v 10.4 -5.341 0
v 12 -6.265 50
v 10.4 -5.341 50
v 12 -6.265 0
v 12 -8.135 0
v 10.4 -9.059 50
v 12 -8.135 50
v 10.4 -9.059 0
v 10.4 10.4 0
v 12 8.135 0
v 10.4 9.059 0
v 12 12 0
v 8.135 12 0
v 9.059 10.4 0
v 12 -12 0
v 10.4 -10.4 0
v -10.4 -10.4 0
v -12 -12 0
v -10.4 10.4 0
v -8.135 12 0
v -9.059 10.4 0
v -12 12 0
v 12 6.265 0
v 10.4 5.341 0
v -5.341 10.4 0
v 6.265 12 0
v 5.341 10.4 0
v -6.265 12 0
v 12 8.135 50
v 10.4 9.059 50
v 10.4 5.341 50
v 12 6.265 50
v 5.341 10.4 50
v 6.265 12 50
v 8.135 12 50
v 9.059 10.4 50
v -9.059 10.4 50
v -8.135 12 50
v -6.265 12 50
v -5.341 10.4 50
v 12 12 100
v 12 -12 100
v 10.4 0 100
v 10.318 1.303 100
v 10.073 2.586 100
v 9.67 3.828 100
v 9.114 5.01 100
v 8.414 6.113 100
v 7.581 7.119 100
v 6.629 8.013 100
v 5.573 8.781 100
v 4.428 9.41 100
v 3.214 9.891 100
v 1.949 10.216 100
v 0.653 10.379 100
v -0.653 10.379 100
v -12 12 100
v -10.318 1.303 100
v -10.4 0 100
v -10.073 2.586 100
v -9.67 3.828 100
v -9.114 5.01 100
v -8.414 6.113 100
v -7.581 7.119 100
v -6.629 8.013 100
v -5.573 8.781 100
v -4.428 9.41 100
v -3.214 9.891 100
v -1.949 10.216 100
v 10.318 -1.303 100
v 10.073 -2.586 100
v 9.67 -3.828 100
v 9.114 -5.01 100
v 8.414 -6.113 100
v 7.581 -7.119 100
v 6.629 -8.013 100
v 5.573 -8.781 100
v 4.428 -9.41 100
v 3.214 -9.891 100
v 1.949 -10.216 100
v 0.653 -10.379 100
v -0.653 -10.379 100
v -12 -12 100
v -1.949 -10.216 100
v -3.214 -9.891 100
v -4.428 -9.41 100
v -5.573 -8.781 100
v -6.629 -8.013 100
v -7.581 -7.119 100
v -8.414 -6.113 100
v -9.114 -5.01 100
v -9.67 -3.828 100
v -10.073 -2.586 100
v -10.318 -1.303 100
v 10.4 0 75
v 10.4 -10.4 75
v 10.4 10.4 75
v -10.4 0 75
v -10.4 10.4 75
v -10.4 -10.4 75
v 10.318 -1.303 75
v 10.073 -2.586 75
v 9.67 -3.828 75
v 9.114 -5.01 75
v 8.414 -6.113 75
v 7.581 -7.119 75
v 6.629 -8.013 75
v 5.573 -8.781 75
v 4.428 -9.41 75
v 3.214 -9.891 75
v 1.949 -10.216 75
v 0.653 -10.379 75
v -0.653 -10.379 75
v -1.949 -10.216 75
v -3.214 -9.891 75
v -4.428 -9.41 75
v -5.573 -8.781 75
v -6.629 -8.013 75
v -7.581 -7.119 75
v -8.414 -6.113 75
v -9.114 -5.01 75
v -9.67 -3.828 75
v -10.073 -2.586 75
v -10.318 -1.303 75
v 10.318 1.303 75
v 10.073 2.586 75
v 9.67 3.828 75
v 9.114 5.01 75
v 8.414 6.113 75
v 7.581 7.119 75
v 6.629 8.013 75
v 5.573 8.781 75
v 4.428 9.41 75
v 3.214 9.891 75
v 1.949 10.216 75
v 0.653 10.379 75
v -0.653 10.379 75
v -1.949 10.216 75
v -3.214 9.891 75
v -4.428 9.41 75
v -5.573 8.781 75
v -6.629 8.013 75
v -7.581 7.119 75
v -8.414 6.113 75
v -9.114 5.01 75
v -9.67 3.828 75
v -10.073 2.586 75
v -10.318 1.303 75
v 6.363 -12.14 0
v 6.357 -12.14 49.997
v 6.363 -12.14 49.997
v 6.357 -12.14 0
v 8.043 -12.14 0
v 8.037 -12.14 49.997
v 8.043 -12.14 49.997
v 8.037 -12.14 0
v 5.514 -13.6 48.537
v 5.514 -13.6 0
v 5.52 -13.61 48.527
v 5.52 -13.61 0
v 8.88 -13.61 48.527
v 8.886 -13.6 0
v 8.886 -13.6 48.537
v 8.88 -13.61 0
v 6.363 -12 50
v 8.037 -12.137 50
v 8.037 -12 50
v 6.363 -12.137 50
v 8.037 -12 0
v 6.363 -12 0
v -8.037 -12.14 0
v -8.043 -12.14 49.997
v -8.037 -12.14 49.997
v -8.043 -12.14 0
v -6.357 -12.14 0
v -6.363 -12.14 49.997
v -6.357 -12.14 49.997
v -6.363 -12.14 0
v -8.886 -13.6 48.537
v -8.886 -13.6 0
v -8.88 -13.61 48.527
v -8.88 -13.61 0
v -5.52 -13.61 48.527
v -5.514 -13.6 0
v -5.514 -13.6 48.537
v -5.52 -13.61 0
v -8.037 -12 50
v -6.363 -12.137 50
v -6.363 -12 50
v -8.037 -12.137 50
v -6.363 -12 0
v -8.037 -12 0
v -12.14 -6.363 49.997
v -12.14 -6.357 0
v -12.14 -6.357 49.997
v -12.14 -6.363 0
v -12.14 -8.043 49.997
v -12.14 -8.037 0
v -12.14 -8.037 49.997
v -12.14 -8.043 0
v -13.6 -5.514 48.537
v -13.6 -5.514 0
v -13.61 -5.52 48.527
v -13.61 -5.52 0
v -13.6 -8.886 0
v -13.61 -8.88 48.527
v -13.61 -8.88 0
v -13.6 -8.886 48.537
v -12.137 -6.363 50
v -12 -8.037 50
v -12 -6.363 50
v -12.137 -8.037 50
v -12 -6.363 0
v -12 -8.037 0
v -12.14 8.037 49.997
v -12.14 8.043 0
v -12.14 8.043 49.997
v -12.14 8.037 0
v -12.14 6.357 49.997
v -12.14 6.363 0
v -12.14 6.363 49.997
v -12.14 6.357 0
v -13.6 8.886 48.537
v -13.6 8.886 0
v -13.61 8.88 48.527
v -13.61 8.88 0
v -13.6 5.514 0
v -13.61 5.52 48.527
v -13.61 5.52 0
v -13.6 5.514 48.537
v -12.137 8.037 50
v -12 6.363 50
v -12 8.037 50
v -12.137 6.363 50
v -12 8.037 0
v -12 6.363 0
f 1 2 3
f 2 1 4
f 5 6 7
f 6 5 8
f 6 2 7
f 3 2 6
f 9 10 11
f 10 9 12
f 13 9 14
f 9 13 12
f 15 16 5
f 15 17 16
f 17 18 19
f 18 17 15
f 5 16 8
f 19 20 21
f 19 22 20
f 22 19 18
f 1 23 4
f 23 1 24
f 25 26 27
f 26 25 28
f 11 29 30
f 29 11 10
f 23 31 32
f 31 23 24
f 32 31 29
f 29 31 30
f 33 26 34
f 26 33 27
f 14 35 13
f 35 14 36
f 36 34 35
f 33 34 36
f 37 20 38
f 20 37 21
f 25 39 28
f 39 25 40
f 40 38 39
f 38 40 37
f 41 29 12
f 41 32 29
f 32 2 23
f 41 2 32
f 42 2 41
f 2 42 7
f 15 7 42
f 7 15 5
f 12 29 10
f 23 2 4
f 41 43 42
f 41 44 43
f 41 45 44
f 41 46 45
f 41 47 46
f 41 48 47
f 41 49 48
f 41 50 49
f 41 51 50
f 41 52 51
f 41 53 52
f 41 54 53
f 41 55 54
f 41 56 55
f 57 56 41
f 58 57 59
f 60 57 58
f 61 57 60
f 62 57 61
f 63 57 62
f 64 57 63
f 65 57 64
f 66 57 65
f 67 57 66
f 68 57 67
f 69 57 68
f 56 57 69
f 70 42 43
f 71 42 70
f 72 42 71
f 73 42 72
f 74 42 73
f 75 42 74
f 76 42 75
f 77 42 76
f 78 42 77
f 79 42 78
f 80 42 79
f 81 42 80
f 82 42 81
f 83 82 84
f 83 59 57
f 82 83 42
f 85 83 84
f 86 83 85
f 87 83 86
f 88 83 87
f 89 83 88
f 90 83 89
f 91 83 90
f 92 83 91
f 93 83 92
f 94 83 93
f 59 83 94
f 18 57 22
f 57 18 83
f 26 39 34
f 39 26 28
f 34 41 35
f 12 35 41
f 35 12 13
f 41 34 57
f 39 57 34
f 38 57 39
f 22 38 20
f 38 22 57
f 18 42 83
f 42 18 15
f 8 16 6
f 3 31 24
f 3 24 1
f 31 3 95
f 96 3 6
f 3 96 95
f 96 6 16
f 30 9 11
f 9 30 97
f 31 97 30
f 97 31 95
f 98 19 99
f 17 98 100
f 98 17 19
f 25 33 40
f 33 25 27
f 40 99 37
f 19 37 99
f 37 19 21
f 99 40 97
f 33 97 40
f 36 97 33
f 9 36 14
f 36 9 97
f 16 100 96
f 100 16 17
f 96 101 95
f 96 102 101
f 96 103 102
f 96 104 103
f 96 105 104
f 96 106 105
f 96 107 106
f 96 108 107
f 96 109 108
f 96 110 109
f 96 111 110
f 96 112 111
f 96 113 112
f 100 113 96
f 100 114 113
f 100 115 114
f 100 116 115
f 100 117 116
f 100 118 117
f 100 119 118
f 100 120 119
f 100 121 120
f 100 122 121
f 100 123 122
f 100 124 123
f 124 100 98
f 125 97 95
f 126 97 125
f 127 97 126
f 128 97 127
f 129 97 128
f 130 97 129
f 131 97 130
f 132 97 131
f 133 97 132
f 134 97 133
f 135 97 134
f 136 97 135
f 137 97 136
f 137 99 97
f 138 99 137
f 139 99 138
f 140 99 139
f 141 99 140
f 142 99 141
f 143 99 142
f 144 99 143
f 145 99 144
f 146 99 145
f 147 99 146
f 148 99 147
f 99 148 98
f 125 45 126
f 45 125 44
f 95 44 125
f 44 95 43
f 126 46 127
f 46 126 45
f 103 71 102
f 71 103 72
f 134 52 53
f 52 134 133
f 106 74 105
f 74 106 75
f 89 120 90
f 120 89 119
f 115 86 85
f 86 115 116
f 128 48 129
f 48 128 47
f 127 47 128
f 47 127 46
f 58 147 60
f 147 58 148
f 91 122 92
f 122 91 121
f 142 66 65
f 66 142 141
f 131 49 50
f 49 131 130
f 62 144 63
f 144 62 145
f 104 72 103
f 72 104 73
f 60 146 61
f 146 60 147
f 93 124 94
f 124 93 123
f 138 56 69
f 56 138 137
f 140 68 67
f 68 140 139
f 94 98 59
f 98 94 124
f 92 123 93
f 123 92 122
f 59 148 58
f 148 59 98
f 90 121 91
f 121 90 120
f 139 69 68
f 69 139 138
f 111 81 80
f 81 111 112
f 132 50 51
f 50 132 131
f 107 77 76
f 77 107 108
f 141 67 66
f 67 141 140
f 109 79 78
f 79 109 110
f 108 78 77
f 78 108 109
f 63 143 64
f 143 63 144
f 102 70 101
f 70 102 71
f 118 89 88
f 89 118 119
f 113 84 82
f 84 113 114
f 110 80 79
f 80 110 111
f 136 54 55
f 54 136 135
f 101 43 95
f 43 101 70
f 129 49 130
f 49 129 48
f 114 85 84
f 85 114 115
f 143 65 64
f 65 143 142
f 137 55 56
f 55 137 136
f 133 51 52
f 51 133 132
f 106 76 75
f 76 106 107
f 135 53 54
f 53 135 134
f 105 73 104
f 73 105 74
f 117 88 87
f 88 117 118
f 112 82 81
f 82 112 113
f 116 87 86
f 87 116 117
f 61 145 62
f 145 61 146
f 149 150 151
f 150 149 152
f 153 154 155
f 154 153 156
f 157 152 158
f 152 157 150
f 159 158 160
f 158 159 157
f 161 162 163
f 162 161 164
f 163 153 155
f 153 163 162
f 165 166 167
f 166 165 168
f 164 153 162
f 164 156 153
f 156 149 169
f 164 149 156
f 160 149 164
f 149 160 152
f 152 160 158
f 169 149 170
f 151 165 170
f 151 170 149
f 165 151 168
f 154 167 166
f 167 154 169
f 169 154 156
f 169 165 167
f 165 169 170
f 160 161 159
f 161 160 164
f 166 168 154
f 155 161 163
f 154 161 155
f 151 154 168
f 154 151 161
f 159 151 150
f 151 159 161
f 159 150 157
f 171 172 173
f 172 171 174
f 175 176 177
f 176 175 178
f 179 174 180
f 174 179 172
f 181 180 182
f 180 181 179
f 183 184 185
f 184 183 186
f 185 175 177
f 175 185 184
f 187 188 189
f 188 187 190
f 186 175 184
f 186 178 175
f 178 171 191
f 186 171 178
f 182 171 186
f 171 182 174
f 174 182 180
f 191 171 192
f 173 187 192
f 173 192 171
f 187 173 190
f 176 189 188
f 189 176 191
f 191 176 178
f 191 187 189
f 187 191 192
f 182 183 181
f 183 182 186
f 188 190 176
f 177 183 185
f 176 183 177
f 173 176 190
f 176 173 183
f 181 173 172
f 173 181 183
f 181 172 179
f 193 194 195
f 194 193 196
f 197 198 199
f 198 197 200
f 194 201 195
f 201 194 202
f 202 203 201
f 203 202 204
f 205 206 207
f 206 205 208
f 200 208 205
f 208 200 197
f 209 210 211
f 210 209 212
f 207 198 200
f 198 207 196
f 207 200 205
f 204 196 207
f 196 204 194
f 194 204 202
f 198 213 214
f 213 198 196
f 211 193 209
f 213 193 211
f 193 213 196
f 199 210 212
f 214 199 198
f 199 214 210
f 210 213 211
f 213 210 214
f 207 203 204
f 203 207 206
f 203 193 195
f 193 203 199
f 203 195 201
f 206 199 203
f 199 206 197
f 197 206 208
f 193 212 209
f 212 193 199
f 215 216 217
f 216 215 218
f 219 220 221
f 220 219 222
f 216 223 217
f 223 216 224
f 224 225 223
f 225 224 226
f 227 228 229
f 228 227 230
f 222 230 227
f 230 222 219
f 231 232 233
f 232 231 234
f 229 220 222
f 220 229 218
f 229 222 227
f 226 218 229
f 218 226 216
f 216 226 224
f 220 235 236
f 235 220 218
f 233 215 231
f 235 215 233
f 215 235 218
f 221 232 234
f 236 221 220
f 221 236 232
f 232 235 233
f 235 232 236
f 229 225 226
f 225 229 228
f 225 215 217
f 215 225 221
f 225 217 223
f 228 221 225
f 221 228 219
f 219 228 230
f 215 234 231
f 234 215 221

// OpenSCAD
moduleSize = 24;
moduleHeight = 100;
moduleWallThickness = 1.6;

topThickness = 25;

defaultHoleSize = moduleSize - moduleWallThickness * 2;

joinerHeight = moduleHeight/2;

function radiusFromInnerRadius(innerRadius, sides) =
    innerRadius/(cos(180/sides));

module innerRadiusCylinder(innerRadius, sides, height, center)
{
    cylinder(h=height, r=radiusFromInnerRadius(innerRadius, sides), center=center, $fn=sides);
}

module joinerShapes(tolerance, heightModifier, makeAngleCut = false)
{
    for (separation=[-1, 1])
    translate([0,separation * moduleSize * .3,moduleHeight/4])
    rotate(a=90, v=[0,0,1])
    difference()
    {
        union()
        {
            // our hexagon shape
            innerRadiusCylinder(moduleWallThickness - tolerance + .01, 6, moduleHeight/2, true);
            
            if (makeAngleCut)
            {
                translate([0,-moduleWallThickness/2,0])
                cube([radiusFromInnerRadius(moduleWallThickness - .15, 6), moduleWallThickness, moduleHeight/2 - 0], center=true);
            }
        }
        
        
        // cut the hexagon in half
        translate([0,(moduleWallThickness+2)/2 + .01,0])
            cube([moduleWallThickness*3, moduleWallThickness+2, moduleHeight], center=true);
        
        if (makeAngleCut)
        {
            // angle on the joiner for printing
            translate([0,moduleWallThickness/2,moduleHeight/4])
            rotate(a=45, v=[1,0,0])
            translate([0,-moduleWallThickness/2,moduleWallThickness/2])
            cube([moduleWallThickness*3, moduleWallThickness, moduleWallThickness*2], center=true);
        }
    }
    
    //innerRadiusCylinder(moduleWallThickness - .15, 6, moduleHeight/2, true);
}

module allJoinerCuts(unitDepth, unitWidth)
{
    for (y=[-((unitWidth-1) /2) * moduleSize:moduleSize:((unitWidth-1) /2) * moduleSize])
    translate([unitDepth/2* moduleSize - moduleWallThickness, y, 0])
        joinerShapes(0, -.2);
    
    for (x=[-((unitDepth-1) /2) * moduleSize:moduleSize:((unitDepth-1) /2) * moduleSize])
    translate([x, unitWidth/2* moduleSize - moduleWallThickness, 0])
    rotate(a=90, v=[0,0,1])
        joinerShapes(0, -.2);
}

module allJoiners(unitDepth, unitWidth)
{
    for (x=[-((unitDepth-1) /2) * moduleSize:moduleSize:((unitDepth-1) /2) * moduleSize])
    translate([x,-unitWidth/2* moduleSize - moduleWallThickness,0])
    rotate(a=90, v=[0,0,1])
        joinerShapes(.15, 0, true);
    
    for (y=[-((unitWidth-1) /2) * moduleSize:moduleSize:((unitWidth-1) /2) * moduleSize])
    translate([-unitDepth/2* moduleSize - moduleWallThickness,y,0])
    rotate(a=0, v=[0,0,1])
        joinerShapes(.15, 0, true);
}

module toolModule(unitDepth = 1, 
                  unitWidth = 1,
                  toolHoleDiameter = defaultHoleSize, 
                  toolHoleWidth = defaultHoleSize, 
                  toolHoleDepth = defaultHoleSize, 
                  toolHoleShape = "circle")
{
    union()
    {
        difference()
        {
            // the main module cube
            translate([0,0,moduleHeight/2])
            cube([moduleSize * unitDepth, moduleSize * unitWidth, moduleHeight], center=true);
            
            // cutout to create the module walls
            translate([0,0,moduleHeight/2])
            cube([moduleSize * unitDepth - moduleWallThickness * 2, 
                  moduleSize * unitWidth - moduleWallThickness * 2, 
                  moduleHeight + 1], center=true);
            
            allJoinerCuts(unitDepth,unitWidth);
            
            
        }
        
        difference()
        {

            // the top of the module
            translate([0,0,moduleHeight - topThickness/2])
            cube([moduleSize * unitDepth,
                  moduleSize * unitWidth,
                  topThickness], center=true);
            
            // the hole for the tool in the top
            if (toolHoleShape == "circle")
            {
                translate([0,0,moduleHeight - topThickness/2])
                cylinder(topThickness * 2, d = toolHoleDiameter, center=true, $fn=50);
            } else {
                translate([0,0,moduleHeight - topThickness/2])
                cube([toolHoleWidth,  toolHoleDepth, topThickness * 2], center=true);
            }
        }
            
        allJoiners(unitDepth, unitWidth);
        
        
    }
}



toolModule(1,1);
